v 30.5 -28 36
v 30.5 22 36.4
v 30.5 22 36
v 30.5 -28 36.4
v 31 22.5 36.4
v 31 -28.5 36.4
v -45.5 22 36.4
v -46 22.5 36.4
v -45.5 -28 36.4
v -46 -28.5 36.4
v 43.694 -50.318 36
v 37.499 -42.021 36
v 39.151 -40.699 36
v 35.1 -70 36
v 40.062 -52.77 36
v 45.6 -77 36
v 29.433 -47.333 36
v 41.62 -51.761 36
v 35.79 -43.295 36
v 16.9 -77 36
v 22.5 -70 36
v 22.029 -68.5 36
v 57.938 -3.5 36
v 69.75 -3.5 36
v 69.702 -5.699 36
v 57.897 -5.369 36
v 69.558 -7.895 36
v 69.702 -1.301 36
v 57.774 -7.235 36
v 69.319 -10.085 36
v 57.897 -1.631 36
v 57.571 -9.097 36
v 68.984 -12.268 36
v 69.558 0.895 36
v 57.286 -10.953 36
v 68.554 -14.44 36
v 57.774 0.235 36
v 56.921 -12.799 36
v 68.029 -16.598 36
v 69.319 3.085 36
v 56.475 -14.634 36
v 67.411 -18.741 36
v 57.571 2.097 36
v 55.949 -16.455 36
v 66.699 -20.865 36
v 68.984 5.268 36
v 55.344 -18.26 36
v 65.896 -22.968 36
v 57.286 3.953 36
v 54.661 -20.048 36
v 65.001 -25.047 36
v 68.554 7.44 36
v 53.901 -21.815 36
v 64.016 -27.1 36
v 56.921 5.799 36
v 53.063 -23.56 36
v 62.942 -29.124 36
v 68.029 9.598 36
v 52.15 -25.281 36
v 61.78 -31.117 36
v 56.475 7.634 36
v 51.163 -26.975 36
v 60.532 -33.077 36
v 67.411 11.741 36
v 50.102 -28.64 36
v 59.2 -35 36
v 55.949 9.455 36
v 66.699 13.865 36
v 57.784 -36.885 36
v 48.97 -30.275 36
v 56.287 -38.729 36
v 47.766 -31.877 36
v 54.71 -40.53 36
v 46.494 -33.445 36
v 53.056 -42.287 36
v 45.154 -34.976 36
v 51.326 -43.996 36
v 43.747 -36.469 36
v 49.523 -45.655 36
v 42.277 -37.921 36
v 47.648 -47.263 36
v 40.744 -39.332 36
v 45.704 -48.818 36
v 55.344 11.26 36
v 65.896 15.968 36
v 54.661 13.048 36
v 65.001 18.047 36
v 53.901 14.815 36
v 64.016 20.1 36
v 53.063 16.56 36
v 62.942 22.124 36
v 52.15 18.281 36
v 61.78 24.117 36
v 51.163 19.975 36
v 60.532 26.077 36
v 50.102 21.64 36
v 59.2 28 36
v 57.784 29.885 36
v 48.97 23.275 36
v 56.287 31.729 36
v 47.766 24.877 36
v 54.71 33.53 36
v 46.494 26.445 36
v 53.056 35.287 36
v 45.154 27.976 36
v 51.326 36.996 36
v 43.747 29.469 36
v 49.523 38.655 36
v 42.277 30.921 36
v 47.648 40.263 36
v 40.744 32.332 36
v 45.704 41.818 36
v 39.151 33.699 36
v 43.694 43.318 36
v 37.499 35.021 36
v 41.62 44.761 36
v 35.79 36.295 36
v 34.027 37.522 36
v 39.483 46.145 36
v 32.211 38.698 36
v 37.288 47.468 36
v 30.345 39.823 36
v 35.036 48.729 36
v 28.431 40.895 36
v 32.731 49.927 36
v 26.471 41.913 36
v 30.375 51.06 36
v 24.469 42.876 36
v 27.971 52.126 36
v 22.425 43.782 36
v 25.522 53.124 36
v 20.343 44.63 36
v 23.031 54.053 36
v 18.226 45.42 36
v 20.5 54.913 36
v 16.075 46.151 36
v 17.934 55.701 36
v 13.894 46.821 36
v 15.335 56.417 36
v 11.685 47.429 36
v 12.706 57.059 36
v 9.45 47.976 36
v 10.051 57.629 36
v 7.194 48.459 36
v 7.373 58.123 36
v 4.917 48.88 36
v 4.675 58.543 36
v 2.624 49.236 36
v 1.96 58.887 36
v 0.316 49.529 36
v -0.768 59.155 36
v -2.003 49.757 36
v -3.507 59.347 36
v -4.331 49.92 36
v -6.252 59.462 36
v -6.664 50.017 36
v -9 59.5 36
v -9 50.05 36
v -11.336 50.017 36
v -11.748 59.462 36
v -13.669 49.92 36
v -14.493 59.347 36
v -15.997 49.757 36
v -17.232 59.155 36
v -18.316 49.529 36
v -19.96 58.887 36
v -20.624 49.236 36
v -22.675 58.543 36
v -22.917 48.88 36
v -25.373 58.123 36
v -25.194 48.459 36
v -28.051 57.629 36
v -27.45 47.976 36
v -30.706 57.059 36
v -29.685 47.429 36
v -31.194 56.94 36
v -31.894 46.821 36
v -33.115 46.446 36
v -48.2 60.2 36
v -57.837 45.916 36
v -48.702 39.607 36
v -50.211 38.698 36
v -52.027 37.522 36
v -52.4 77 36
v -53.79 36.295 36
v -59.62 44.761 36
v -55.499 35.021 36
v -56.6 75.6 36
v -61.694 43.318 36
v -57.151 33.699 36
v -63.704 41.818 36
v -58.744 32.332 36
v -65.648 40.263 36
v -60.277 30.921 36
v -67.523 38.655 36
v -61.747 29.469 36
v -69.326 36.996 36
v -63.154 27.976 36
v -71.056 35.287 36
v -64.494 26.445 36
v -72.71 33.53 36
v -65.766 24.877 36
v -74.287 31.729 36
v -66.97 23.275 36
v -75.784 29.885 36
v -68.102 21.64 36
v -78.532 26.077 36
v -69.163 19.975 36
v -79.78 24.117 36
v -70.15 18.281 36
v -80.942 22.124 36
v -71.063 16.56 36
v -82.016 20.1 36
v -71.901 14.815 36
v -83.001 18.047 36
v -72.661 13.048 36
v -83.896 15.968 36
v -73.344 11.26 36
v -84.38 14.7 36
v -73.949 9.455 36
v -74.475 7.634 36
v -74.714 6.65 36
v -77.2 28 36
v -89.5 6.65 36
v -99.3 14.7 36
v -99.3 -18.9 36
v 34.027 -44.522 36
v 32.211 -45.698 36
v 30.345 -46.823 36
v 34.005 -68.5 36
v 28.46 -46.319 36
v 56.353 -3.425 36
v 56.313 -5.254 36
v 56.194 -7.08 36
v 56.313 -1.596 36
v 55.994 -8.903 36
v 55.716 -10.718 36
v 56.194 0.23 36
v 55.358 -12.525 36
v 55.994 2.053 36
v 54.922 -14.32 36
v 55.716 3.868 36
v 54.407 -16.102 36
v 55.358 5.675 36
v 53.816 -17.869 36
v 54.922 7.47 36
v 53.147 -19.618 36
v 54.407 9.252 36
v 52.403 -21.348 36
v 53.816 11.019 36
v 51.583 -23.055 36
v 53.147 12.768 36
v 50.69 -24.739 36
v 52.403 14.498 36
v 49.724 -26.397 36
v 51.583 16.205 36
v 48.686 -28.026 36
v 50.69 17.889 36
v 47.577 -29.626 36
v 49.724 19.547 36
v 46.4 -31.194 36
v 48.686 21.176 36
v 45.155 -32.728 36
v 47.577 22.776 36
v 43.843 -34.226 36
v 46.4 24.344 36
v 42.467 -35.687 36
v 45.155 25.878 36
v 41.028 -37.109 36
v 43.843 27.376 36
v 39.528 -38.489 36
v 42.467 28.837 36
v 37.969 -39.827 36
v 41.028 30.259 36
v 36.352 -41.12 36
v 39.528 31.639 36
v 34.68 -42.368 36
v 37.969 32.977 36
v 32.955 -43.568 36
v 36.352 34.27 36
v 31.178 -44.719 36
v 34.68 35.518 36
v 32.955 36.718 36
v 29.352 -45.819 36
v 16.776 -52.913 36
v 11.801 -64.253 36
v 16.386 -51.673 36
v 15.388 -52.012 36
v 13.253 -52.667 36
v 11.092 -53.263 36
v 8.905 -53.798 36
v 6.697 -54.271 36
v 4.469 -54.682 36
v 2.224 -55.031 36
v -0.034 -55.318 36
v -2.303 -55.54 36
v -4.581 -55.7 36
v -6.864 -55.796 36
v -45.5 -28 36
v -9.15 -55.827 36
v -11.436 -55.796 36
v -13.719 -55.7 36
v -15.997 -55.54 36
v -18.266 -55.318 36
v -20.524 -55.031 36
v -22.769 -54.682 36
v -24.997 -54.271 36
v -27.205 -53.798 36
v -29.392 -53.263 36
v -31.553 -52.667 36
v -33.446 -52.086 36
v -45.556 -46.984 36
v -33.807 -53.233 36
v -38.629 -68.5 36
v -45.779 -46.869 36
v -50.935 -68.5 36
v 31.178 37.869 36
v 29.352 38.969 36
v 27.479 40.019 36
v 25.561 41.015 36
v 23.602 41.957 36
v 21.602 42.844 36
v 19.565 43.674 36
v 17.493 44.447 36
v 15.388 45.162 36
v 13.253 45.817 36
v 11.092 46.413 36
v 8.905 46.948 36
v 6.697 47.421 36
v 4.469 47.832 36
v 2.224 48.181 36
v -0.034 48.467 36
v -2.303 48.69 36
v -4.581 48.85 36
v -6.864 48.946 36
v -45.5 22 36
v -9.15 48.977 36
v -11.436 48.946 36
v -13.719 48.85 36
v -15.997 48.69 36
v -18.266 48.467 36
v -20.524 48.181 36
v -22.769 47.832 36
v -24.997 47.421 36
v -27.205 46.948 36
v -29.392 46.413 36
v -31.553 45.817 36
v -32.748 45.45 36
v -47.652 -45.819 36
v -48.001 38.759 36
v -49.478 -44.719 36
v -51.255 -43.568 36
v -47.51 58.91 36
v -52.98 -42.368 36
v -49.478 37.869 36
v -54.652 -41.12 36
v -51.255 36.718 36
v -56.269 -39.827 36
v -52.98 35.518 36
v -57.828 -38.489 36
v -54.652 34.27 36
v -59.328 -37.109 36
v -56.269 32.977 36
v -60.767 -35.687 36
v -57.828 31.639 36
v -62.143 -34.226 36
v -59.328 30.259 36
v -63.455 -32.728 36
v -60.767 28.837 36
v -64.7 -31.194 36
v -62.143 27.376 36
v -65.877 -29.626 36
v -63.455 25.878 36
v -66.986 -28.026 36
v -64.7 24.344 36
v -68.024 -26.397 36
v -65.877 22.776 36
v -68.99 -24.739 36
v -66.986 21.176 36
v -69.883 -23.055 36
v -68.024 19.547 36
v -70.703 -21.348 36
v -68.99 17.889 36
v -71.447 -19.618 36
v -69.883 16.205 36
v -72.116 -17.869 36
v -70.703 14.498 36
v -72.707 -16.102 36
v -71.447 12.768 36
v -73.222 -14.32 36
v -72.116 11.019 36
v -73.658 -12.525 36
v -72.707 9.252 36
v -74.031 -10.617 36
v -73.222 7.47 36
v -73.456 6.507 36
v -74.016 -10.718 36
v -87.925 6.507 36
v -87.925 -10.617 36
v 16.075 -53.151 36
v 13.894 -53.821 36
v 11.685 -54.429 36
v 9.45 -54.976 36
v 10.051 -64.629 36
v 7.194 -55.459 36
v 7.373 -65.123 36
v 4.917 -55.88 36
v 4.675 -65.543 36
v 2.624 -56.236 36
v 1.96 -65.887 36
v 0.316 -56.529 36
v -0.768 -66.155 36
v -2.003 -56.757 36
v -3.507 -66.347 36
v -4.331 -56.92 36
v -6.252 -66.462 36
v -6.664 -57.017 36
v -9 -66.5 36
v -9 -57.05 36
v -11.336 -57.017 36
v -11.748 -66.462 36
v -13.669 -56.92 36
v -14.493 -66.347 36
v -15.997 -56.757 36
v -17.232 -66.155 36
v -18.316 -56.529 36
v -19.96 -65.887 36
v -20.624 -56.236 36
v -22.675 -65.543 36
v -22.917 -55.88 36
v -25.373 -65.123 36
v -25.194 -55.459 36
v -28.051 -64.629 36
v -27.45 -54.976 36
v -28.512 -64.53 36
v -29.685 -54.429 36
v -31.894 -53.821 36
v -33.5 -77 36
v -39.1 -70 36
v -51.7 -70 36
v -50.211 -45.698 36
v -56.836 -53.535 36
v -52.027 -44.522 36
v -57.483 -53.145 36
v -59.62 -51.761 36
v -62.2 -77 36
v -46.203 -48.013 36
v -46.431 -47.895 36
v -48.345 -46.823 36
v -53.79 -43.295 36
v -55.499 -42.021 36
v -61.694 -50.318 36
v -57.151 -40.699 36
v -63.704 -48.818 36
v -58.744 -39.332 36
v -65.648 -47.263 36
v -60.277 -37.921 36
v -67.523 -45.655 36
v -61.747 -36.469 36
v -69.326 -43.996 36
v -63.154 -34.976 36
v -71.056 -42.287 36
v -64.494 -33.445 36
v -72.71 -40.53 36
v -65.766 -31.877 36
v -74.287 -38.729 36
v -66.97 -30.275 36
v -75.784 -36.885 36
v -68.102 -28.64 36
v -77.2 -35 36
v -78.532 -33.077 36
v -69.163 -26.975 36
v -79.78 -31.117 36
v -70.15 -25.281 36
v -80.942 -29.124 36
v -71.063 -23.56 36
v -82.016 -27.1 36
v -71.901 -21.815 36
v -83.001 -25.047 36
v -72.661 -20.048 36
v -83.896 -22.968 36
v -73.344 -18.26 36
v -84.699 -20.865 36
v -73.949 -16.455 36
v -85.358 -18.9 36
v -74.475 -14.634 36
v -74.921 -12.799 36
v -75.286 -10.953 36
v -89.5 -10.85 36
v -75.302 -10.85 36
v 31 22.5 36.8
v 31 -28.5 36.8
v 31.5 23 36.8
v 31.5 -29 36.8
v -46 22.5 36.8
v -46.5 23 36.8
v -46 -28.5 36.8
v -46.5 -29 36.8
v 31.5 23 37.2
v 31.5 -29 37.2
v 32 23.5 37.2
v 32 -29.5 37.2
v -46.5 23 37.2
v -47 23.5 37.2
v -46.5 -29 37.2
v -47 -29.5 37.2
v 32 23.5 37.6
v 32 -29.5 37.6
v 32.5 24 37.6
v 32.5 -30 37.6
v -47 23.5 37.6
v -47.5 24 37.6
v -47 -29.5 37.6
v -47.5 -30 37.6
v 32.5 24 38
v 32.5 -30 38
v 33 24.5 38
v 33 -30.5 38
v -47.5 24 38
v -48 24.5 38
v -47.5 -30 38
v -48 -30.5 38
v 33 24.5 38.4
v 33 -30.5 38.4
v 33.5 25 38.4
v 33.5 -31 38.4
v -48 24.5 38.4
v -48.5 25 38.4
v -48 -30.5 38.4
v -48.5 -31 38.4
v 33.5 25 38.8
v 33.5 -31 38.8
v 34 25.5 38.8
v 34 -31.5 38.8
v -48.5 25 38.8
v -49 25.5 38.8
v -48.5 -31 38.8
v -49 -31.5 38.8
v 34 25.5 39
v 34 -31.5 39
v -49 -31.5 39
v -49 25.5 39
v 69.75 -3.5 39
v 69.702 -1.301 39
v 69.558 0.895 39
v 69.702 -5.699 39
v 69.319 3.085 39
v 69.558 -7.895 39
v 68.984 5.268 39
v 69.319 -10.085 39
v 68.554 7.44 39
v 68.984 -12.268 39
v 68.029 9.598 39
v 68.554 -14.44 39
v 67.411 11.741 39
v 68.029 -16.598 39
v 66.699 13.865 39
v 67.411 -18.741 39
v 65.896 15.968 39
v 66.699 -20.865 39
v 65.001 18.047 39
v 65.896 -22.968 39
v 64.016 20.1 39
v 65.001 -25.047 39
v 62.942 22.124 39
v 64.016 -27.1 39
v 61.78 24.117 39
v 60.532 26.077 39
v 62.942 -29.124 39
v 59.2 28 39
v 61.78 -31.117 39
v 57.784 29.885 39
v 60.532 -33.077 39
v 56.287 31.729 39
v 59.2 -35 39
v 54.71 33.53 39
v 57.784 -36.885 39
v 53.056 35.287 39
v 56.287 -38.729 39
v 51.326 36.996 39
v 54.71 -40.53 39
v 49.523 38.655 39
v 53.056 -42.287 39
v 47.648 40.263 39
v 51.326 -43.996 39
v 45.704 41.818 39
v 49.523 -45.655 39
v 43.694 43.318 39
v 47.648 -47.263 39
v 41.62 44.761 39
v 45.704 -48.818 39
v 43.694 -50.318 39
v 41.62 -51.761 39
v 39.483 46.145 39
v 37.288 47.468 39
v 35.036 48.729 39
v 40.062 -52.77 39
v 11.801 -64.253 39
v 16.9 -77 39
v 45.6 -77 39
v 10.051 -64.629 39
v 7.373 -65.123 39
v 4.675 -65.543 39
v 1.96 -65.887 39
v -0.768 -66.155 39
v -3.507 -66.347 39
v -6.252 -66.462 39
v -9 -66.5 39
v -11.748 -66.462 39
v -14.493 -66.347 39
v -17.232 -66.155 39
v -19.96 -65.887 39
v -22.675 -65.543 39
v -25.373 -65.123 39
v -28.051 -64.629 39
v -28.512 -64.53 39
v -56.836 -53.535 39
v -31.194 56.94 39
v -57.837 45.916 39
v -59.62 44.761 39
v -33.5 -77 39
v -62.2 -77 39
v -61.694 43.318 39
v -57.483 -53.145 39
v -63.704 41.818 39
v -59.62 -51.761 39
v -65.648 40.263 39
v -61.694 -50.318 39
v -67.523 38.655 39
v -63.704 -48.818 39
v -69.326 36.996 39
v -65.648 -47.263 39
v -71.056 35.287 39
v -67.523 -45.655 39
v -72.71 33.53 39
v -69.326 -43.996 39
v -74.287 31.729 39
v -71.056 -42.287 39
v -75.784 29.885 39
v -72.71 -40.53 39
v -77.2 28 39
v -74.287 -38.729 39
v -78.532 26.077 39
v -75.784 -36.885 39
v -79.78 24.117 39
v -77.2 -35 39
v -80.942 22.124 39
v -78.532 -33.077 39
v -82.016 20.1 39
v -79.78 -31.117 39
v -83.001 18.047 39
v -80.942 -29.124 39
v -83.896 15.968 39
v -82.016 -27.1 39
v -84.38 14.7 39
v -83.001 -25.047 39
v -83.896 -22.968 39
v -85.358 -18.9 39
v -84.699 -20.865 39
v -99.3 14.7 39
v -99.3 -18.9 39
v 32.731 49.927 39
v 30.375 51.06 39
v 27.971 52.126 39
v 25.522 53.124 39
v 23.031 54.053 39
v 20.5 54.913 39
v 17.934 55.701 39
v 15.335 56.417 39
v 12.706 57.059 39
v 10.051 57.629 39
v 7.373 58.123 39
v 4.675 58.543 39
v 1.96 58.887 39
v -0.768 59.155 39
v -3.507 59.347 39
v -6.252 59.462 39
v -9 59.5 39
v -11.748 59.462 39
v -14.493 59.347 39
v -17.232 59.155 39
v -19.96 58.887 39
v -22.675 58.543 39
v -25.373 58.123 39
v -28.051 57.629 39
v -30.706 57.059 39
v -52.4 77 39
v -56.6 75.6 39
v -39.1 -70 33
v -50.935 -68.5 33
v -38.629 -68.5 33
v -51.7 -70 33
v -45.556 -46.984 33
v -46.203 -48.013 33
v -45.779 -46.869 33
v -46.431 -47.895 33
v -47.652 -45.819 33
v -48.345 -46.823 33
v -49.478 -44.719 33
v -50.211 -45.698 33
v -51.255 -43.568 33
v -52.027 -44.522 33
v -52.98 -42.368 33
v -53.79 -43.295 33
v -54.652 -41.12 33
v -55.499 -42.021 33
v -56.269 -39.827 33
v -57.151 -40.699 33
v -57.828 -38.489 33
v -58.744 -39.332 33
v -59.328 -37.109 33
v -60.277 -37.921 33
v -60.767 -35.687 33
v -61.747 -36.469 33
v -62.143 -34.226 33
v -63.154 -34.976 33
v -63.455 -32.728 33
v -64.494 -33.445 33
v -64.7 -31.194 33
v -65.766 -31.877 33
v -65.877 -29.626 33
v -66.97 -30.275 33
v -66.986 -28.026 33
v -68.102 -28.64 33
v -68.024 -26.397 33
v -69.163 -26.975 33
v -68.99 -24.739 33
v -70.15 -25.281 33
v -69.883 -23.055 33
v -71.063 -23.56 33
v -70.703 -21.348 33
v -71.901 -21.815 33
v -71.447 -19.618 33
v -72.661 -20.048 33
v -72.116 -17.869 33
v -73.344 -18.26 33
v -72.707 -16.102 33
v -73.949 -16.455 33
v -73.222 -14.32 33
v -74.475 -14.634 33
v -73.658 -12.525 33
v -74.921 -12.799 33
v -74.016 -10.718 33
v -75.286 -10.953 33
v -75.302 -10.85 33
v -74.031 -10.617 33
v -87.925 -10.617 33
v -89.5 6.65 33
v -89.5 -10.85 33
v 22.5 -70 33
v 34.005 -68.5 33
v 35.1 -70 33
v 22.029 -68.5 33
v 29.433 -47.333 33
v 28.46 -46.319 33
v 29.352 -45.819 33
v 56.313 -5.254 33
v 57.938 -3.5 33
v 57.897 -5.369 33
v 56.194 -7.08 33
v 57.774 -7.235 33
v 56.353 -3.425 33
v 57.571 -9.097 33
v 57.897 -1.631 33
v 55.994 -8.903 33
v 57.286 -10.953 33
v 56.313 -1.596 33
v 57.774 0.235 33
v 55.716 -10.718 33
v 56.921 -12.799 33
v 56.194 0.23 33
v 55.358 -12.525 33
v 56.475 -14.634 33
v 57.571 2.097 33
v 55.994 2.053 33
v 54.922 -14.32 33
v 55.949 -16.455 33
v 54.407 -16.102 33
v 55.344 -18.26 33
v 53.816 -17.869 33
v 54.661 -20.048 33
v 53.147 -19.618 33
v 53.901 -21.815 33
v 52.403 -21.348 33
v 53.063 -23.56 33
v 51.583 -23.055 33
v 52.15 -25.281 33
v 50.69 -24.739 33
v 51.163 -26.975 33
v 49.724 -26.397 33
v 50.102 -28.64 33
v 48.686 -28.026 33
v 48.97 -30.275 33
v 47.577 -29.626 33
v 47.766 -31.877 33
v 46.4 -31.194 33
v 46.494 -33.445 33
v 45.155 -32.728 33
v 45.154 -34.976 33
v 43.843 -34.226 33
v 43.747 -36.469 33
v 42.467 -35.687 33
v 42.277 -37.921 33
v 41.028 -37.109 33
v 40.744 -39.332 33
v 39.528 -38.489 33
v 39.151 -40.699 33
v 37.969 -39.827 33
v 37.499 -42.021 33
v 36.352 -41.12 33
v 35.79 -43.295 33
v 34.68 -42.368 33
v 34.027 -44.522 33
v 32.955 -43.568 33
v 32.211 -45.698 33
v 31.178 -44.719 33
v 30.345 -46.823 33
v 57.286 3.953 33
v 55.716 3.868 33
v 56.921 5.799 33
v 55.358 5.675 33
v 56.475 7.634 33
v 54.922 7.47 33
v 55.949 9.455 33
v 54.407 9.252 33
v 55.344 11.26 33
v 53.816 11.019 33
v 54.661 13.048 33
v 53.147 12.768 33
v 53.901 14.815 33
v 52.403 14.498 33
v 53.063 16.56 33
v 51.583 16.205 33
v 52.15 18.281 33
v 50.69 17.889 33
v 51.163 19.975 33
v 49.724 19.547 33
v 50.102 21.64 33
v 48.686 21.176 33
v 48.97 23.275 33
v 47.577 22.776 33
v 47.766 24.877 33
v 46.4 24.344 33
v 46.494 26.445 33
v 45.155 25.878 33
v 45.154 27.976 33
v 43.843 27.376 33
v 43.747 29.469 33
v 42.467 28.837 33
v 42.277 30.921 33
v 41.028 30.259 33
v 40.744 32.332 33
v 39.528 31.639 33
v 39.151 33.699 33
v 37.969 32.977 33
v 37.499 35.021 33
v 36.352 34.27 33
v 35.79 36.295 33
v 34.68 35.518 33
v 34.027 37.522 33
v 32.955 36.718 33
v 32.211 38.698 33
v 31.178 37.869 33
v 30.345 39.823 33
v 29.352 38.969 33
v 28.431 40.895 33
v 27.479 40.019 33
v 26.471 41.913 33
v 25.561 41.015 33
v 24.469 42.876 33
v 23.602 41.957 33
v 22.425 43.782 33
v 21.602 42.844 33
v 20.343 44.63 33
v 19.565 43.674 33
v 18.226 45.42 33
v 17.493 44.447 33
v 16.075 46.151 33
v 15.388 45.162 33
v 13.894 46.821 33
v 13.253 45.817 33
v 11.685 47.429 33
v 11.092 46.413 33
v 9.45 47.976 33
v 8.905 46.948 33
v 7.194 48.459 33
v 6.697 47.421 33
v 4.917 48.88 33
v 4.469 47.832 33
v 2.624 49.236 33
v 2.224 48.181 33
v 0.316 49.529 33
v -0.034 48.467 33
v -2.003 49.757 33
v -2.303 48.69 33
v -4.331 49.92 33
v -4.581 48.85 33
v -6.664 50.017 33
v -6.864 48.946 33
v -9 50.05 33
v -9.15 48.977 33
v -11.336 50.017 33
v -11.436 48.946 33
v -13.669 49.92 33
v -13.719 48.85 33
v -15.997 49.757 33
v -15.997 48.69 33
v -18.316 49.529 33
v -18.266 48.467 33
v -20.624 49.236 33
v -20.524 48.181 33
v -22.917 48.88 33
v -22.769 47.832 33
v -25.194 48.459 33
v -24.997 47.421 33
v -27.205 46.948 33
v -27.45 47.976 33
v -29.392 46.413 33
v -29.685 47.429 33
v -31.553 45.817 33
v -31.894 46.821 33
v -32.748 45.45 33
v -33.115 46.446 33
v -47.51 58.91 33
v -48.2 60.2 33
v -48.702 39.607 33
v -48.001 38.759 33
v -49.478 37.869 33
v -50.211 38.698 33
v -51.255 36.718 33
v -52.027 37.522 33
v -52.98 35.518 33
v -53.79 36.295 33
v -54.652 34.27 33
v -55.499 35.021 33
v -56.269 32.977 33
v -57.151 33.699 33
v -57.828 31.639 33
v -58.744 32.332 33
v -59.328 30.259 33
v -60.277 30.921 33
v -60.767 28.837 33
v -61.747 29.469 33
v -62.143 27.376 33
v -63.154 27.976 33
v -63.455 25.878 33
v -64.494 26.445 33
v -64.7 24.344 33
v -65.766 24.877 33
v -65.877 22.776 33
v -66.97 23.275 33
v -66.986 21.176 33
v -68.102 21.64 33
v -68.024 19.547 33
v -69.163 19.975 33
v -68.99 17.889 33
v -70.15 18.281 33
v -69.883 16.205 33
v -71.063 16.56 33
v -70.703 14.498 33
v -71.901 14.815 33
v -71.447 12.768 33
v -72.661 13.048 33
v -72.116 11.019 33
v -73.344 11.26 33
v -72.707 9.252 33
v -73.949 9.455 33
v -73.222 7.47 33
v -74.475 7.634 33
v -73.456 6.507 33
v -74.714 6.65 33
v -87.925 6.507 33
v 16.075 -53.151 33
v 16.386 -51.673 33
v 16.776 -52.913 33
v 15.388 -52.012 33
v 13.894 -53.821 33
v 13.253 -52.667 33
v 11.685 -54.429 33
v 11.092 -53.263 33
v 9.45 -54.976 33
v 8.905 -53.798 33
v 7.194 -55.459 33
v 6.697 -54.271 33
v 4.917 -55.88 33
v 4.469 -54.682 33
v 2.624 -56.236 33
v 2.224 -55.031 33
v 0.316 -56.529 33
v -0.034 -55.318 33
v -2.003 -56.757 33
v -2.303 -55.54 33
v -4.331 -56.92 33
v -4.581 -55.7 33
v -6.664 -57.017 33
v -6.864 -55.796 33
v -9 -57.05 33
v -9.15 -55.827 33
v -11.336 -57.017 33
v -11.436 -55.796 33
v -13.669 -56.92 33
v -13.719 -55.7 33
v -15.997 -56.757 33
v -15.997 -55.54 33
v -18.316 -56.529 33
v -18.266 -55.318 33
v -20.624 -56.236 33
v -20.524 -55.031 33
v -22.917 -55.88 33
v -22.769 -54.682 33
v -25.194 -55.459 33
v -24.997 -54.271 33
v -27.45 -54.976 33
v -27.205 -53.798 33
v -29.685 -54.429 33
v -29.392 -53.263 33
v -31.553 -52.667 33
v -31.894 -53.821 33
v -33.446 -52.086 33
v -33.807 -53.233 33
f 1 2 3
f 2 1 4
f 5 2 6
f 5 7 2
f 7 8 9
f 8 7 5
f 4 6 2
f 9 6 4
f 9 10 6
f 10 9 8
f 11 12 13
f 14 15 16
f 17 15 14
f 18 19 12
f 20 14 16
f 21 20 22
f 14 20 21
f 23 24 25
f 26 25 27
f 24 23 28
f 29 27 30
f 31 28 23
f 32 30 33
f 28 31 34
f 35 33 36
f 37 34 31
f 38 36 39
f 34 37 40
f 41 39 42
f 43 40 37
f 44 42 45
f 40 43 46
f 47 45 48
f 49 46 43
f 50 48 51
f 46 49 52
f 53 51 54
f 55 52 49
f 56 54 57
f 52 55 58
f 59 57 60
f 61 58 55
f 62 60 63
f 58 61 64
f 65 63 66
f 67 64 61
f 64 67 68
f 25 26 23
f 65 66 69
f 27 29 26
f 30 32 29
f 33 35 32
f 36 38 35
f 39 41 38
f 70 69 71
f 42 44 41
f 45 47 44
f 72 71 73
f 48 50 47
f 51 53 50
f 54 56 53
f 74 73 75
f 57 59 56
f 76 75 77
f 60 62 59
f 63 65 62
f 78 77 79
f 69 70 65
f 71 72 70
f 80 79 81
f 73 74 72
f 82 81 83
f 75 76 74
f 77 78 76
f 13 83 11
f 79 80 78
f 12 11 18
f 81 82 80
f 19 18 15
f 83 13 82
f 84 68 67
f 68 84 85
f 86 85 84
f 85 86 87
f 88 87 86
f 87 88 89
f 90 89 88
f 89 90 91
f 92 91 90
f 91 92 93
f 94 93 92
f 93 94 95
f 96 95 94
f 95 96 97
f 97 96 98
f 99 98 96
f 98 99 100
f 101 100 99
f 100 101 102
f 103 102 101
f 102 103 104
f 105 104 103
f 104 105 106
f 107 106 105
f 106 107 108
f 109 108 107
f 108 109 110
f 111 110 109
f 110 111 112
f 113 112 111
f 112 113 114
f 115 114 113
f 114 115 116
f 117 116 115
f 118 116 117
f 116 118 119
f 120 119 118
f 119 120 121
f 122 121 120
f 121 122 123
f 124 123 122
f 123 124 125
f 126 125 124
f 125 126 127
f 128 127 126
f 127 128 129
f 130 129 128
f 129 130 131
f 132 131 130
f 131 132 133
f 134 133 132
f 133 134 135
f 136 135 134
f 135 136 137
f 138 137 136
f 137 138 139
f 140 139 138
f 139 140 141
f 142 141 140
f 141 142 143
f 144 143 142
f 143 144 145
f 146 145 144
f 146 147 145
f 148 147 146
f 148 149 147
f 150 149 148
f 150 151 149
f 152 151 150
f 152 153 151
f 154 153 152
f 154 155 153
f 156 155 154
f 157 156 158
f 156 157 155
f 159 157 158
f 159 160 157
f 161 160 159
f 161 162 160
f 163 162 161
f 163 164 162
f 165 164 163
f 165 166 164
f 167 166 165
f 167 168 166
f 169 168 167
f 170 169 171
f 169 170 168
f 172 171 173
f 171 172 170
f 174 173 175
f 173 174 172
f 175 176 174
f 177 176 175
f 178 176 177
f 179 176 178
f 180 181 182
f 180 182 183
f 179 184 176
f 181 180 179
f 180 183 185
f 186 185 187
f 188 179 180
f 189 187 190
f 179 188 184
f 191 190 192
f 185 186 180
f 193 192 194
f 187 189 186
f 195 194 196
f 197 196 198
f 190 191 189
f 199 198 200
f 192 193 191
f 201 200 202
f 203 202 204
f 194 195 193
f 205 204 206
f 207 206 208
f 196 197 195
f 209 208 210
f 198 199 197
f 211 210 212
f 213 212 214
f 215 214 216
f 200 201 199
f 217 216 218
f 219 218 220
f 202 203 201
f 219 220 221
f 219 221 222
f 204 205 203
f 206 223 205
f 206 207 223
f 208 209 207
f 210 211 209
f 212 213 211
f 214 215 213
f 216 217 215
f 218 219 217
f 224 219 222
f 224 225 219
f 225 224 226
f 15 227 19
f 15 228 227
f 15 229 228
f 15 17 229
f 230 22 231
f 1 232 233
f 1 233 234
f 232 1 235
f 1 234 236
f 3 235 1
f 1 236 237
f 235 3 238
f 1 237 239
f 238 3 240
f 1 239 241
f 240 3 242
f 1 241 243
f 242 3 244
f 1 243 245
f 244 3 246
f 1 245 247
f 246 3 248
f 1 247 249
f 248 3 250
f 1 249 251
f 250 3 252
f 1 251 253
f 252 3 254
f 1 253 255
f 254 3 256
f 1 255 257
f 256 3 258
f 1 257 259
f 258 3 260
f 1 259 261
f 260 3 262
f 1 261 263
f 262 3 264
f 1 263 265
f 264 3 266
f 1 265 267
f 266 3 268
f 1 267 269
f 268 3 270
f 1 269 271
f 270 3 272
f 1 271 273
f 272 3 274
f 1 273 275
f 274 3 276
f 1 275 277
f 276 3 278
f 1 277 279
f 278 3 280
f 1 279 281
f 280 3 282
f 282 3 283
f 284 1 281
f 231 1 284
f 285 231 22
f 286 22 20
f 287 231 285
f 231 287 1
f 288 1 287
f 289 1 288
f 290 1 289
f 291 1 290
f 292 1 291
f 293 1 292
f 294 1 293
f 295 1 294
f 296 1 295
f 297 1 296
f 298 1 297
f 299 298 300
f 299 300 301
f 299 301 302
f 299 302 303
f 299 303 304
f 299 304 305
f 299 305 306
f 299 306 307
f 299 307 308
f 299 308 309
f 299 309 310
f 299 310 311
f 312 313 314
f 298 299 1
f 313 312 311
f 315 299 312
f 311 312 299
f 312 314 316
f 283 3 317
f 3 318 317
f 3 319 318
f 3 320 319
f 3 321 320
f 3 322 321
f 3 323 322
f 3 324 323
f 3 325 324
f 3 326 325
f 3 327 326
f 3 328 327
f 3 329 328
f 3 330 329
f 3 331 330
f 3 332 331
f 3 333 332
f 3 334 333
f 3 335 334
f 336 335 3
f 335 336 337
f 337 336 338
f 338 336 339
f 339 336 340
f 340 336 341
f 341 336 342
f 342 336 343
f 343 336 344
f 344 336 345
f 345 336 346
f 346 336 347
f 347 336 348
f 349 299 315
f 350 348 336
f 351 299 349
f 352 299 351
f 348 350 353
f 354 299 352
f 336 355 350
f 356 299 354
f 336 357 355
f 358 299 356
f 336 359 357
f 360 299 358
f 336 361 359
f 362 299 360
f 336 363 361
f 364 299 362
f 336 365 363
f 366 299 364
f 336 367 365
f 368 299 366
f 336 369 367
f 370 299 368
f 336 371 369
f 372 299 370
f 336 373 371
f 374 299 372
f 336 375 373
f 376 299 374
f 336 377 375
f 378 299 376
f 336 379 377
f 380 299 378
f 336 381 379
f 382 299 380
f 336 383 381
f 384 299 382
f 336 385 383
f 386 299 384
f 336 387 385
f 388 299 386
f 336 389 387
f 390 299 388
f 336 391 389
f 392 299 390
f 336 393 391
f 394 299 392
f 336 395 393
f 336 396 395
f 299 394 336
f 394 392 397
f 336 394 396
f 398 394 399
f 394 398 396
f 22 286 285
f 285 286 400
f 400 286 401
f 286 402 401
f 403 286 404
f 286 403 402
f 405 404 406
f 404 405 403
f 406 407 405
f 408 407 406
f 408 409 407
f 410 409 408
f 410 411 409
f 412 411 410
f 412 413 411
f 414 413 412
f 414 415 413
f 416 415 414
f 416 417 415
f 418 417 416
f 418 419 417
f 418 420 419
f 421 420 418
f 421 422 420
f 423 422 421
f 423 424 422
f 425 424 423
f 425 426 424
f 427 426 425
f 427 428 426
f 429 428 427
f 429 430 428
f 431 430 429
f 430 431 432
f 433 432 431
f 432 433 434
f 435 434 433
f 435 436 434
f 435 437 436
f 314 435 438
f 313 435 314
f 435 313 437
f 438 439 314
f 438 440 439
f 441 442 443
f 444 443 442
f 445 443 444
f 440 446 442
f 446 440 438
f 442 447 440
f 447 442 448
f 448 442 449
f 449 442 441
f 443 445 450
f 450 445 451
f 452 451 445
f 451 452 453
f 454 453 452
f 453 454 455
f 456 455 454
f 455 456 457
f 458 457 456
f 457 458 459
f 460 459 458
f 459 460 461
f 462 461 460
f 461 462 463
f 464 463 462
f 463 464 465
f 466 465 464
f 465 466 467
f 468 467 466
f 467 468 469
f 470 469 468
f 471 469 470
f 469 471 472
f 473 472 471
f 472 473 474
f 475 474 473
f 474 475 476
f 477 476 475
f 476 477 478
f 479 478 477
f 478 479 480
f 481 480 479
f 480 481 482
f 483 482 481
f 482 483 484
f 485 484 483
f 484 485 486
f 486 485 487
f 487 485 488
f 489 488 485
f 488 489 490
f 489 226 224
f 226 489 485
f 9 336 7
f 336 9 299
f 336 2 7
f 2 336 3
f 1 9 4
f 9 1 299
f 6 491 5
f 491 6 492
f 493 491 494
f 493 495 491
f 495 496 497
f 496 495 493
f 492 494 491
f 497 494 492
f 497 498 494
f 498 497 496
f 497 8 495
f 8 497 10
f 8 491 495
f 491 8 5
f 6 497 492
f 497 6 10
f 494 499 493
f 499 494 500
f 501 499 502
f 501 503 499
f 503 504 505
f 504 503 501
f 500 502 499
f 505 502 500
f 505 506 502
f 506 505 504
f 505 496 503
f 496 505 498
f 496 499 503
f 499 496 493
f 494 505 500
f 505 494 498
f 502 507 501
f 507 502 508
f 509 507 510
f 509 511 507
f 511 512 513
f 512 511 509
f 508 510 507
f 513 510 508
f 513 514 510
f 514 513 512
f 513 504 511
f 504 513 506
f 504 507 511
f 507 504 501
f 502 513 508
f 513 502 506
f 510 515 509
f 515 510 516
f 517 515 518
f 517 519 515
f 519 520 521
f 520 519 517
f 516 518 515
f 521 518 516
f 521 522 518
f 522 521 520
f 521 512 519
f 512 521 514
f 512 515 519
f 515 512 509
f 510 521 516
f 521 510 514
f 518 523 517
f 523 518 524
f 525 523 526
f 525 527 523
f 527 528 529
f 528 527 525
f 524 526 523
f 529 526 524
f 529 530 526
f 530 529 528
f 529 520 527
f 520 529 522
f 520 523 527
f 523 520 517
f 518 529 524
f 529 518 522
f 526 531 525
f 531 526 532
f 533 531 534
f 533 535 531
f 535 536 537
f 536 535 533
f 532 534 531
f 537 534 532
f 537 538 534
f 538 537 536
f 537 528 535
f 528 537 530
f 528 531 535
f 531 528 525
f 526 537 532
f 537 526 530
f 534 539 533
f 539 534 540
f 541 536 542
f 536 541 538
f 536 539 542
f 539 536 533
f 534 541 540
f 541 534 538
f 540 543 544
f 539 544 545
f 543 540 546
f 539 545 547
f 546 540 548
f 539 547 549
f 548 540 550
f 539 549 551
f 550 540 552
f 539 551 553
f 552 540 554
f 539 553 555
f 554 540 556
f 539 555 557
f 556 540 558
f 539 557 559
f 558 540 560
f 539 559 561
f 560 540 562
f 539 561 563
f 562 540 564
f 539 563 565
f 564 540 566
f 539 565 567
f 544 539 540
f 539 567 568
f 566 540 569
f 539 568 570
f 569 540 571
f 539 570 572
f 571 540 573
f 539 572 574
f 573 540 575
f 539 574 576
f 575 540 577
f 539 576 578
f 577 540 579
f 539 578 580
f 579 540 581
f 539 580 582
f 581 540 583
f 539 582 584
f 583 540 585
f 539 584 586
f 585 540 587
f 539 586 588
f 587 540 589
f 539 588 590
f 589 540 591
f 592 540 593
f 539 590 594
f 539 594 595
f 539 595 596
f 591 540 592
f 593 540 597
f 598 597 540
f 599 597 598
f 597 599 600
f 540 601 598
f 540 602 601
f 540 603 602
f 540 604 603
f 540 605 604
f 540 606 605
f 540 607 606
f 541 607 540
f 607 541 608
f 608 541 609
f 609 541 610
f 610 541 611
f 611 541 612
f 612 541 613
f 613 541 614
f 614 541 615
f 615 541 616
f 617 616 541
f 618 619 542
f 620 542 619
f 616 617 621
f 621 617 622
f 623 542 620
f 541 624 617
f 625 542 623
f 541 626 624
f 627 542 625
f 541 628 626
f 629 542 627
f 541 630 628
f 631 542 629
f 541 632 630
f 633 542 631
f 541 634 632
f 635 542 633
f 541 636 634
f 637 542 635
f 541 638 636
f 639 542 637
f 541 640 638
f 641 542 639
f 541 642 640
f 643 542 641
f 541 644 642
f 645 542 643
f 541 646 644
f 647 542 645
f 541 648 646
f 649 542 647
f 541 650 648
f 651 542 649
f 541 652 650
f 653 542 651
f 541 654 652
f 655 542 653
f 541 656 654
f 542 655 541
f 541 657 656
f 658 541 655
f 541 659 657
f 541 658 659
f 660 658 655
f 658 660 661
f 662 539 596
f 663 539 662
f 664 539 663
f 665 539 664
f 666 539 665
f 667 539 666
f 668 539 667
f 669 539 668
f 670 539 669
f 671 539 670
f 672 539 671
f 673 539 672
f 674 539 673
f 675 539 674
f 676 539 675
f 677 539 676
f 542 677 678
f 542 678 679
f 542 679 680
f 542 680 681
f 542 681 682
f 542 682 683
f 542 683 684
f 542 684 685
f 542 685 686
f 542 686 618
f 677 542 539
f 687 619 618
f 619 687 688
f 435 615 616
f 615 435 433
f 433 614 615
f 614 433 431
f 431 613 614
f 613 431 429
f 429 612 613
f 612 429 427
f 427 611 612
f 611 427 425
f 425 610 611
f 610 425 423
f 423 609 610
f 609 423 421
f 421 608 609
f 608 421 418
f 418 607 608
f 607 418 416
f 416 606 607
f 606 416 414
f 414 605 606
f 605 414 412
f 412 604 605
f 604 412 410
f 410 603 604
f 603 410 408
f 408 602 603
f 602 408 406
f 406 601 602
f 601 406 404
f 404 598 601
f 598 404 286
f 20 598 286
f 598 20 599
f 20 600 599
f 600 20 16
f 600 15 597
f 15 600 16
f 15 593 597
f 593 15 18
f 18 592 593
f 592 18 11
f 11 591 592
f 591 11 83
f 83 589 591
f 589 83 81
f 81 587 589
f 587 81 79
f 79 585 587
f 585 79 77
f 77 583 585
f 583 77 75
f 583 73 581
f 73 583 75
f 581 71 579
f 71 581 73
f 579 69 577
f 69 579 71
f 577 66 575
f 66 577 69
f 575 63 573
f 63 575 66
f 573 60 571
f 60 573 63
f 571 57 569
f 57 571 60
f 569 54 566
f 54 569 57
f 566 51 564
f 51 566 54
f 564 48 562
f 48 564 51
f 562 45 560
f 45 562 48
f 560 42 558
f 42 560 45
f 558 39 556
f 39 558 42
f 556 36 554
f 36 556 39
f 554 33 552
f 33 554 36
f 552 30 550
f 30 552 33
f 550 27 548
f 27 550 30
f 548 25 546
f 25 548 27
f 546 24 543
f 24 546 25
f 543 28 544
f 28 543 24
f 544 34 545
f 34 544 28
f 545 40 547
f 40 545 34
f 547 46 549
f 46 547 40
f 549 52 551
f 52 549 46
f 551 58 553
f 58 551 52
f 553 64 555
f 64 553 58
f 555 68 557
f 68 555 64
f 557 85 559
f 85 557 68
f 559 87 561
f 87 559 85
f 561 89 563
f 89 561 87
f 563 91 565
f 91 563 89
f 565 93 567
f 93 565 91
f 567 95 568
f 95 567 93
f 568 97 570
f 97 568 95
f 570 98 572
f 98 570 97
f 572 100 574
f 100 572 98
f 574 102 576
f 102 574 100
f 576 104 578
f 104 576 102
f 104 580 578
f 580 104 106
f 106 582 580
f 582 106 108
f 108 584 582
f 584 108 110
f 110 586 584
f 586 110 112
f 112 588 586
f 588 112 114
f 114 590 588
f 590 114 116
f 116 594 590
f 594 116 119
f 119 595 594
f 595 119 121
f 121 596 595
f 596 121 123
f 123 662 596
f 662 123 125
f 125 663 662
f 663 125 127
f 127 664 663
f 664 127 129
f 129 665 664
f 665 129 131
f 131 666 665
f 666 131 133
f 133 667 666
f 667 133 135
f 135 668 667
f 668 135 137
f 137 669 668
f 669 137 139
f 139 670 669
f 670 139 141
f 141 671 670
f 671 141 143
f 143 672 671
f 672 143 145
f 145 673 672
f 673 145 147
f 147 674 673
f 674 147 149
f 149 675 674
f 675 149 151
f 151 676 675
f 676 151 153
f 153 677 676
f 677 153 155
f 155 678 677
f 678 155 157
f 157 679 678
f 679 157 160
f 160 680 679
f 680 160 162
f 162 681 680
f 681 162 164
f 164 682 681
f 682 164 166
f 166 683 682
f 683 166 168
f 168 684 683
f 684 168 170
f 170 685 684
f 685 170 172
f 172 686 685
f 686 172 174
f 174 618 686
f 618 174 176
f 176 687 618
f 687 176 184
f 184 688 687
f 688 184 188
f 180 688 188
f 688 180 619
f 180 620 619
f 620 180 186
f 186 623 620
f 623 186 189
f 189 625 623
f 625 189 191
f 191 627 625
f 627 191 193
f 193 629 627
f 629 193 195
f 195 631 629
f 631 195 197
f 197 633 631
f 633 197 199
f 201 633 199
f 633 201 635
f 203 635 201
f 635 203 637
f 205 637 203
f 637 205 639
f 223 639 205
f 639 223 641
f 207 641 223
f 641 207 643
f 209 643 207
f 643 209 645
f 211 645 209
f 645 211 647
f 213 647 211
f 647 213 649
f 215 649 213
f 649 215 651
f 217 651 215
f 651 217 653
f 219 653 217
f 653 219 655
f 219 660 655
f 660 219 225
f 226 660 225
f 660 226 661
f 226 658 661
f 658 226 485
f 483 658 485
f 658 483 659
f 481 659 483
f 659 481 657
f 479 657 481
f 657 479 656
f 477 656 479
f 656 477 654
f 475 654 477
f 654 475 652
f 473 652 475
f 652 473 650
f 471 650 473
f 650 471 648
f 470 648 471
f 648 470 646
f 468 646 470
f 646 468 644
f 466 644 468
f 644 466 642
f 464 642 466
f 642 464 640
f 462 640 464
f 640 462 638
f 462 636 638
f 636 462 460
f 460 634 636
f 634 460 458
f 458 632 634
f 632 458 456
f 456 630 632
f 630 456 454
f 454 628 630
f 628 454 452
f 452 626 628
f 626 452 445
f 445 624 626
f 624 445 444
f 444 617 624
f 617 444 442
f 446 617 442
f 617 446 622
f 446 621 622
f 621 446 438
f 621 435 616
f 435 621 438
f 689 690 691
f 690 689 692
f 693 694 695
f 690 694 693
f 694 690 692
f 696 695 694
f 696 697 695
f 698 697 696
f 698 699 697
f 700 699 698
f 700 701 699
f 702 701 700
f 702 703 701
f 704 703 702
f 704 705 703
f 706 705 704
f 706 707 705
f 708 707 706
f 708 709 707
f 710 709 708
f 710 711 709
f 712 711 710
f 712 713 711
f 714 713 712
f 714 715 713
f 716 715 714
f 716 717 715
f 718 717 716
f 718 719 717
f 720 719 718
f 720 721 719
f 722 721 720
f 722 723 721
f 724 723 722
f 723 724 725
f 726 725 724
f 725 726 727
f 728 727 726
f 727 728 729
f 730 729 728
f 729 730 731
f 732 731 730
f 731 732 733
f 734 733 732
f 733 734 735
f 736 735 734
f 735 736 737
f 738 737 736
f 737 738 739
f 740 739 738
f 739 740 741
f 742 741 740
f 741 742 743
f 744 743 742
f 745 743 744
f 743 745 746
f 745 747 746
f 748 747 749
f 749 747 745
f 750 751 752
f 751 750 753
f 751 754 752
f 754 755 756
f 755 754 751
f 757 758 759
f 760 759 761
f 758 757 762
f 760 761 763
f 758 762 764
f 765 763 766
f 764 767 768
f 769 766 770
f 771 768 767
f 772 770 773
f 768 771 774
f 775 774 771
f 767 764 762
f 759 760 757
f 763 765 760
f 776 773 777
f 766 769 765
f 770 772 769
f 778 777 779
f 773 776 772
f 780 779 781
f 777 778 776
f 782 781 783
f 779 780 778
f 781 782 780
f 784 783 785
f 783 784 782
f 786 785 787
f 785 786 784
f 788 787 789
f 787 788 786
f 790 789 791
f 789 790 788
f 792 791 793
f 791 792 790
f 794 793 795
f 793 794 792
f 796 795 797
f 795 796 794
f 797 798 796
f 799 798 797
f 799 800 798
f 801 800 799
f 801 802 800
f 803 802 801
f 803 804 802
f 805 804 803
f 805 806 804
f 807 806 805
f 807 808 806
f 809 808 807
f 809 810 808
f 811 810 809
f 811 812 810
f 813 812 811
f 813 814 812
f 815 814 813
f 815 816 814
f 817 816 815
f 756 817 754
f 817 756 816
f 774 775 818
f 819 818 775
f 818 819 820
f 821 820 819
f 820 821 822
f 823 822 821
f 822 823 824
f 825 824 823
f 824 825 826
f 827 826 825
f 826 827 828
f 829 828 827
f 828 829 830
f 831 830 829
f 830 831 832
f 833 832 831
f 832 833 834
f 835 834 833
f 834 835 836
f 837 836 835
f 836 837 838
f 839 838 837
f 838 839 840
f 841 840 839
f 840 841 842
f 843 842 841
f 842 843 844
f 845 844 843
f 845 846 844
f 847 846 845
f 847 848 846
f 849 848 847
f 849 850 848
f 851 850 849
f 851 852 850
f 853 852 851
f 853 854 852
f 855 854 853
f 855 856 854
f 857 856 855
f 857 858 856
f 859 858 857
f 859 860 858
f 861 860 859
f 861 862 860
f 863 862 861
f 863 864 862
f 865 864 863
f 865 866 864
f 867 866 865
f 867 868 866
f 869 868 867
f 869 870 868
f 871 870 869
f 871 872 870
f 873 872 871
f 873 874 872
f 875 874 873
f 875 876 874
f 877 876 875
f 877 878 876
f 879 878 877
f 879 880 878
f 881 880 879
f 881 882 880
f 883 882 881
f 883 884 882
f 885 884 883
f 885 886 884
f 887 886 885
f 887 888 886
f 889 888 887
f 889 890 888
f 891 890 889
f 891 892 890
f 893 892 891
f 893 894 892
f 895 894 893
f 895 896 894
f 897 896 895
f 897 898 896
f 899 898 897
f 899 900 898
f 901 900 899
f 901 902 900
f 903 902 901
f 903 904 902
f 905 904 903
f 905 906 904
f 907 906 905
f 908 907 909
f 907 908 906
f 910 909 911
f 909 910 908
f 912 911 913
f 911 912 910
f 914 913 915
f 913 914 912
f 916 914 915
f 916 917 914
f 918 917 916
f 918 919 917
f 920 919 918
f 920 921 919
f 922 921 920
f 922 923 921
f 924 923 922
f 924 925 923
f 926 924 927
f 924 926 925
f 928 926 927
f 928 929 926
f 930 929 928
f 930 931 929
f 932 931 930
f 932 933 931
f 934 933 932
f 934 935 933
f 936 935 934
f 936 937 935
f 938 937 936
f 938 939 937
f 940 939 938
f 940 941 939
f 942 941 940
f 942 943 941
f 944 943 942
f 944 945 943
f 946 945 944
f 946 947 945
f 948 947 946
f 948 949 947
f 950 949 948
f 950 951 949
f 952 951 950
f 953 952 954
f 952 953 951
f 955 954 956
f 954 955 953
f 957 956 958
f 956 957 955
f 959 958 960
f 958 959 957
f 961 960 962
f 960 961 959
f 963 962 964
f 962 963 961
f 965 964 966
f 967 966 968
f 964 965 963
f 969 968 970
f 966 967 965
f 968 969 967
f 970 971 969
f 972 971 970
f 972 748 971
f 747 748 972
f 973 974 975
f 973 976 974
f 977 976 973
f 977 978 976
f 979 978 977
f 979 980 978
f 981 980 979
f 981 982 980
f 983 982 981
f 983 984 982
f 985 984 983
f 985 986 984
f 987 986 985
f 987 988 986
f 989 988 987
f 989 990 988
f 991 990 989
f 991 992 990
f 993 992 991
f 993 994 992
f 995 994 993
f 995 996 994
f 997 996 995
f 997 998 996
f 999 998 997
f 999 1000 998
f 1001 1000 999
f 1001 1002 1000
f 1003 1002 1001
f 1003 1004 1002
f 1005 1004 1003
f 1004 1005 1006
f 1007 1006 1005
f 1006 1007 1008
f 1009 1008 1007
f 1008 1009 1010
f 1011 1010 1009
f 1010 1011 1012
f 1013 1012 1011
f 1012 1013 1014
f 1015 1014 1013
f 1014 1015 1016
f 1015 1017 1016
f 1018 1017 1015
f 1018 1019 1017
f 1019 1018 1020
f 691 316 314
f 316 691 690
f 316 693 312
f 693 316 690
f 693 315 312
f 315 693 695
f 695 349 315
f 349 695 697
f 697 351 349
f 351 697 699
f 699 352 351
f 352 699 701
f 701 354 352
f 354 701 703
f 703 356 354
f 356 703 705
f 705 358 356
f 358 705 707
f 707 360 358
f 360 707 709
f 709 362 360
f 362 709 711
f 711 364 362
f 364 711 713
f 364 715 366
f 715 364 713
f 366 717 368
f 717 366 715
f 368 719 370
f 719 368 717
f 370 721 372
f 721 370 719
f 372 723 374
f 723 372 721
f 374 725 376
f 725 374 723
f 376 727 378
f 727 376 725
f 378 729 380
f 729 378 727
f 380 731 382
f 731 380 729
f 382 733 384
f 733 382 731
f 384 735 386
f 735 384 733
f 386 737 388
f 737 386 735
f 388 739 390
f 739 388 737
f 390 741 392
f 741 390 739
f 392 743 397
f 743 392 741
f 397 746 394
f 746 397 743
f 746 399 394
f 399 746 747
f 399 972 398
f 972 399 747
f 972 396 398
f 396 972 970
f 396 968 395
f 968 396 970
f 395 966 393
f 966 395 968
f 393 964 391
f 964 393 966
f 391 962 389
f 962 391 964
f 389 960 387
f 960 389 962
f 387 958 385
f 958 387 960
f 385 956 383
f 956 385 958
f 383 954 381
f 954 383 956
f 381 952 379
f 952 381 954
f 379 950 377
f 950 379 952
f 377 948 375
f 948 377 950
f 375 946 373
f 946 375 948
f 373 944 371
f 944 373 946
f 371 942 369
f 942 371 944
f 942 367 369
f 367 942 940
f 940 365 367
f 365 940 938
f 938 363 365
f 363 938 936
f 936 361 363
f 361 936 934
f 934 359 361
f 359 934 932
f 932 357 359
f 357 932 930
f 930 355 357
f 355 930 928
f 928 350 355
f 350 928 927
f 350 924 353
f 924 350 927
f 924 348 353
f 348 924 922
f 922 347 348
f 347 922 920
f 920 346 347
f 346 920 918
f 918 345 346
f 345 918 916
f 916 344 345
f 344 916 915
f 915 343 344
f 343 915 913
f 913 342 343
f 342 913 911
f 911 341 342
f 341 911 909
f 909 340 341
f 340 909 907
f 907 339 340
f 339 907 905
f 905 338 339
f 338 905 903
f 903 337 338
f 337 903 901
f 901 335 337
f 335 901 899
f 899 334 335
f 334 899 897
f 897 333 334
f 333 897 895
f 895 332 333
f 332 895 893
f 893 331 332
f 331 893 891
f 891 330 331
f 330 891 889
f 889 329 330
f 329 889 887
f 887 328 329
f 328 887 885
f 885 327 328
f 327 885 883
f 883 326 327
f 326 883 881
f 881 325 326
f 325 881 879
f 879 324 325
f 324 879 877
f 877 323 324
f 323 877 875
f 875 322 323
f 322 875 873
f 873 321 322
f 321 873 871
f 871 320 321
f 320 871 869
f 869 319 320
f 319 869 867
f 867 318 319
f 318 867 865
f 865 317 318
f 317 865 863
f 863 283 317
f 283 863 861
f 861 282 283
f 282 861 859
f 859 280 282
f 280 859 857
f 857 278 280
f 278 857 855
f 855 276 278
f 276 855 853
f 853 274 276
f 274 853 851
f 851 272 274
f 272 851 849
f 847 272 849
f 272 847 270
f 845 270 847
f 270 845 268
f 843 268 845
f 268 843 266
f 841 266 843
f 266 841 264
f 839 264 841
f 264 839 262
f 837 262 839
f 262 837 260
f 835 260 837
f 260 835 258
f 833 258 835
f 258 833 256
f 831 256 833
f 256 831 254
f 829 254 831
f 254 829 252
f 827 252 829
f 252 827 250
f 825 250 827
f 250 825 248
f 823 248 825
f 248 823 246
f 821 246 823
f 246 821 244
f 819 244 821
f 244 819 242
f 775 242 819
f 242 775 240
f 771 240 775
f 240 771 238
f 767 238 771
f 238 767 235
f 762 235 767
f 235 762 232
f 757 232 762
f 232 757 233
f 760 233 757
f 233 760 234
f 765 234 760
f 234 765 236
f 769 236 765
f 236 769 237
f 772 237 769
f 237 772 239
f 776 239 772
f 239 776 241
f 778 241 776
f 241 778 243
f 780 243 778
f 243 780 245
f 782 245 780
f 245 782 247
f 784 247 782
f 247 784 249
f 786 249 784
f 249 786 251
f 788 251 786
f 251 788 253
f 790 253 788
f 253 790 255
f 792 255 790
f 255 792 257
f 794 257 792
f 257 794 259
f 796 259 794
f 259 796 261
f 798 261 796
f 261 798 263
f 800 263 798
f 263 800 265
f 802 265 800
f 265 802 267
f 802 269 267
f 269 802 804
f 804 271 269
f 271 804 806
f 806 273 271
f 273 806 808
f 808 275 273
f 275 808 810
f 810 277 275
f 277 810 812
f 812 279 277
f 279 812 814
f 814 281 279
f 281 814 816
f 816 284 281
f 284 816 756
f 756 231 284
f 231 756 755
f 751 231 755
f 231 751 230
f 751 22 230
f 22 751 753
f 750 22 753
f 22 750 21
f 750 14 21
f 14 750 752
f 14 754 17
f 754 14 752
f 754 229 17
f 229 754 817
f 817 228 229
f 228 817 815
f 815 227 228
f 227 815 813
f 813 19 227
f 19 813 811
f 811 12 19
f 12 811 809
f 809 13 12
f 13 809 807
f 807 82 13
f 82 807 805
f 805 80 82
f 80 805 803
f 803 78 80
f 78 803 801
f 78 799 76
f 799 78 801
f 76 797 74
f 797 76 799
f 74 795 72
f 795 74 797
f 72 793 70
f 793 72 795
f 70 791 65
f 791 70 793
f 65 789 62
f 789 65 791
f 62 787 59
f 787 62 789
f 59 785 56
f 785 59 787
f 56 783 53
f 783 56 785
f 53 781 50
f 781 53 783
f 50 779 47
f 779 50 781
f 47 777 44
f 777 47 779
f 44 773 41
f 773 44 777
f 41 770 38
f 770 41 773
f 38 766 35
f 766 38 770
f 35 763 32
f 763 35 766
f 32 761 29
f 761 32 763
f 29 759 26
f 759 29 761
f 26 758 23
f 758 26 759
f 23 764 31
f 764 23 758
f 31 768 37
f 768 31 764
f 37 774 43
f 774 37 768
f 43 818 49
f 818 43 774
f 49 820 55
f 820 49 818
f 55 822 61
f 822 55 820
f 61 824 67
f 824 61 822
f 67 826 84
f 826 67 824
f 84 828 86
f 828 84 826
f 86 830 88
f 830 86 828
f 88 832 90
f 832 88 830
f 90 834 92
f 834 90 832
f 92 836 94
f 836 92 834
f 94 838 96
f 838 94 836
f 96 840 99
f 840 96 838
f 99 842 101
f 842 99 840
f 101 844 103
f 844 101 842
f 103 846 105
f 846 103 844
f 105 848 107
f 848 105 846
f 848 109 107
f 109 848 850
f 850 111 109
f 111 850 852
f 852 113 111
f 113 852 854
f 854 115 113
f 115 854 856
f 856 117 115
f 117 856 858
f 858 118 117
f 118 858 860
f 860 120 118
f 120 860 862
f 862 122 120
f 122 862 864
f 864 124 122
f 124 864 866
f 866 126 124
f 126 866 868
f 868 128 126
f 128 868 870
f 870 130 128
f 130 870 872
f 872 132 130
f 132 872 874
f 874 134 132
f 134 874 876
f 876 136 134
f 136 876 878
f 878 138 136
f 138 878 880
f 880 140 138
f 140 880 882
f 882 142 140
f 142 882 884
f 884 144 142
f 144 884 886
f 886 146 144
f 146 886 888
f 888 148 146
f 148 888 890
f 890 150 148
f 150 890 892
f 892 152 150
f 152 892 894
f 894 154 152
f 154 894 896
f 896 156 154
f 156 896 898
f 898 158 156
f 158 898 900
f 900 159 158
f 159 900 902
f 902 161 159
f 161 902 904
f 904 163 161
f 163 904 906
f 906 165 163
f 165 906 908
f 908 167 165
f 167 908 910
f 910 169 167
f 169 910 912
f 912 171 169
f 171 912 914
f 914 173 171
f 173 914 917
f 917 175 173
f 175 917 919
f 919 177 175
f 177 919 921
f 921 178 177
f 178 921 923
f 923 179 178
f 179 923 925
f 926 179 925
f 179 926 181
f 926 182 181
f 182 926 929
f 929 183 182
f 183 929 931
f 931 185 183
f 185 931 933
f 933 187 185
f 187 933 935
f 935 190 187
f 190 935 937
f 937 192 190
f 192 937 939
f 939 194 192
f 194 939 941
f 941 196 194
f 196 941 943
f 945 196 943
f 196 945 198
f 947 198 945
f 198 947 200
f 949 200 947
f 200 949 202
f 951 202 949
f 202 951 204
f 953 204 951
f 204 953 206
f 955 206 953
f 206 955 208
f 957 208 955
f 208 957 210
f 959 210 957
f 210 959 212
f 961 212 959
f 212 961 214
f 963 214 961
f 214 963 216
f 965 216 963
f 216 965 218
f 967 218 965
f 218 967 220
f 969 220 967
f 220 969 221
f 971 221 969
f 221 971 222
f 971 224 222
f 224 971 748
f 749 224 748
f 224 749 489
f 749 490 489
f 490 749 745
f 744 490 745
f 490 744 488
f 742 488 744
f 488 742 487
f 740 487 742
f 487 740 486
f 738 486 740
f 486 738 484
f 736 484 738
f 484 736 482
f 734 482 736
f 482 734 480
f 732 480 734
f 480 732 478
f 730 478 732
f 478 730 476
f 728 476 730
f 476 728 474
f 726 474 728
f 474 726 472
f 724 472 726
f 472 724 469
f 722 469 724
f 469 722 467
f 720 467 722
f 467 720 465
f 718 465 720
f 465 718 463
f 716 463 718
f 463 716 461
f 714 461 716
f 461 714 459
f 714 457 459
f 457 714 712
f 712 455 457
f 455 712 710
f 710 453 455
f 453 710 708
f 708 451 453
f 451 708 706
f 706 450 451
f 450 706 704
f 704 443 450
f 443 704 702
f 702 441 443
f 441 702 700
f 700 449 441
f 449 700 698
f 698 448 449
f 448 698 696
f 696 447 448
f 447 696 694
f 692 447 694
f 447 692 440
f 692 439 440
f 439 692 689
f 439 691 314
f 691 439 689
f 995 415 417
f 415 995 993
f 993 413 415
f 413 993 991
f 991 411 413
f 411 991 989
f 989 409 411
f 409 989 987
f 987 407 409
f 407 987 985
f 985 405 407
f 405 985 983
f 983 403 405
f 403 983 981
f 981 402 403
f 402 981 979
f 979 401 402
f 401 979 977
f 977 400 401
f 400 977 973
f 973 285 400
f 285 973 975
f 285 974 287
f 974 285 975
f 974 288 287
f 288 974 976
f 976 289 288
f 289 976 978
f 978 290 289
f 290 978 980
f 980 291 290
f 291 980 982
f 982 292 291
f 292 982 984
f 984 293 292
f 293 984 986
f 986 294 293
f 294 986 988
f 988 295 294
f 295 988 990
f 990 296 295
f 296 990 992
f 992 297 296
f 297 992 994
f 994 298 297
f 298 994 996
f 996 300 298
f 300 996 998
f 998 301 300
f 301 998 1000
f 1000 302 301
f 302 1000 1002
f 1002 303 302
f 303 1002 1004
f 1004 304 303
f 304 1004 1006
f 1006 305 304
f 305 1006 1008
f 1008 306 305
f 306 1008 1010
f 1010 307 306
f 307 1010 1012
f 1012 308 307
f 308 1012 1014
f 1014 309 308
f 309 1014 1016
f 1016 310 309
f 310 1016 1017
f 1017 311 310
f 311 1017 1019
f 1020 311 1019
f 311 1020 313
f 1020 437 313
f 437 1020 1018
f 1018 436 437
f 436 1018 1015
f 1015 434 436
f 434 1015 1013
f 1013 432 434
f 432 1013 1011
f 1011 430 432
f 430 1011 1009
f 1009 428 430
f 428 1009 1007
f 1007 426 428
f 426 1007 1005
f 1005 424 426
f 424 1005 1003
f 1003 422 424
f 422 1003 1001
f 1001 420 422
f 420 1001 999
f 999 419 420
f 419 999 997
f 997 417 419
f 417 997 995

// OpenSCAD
module pig_body(){
    translate([10, -5, 0])
    scale([2.25,1.8,0])
    difference() {
        circle(d=100, $fn=180);
    }
};

module pig_body_inner(){
    translate([10, -5, 0])
    scale([2.25,1.8,0])
    difference() {
        circle(d=85, $fn=180);
    }
};

module pig_foot() {
    polygon([[-58,-75],[-66, -110],[-25,-110],[-15, -85]]);        
};

module pig_foot_inner() {
    polygon([[-41,-60],[-51,-100],[-33,-100],[-22,-65]]);
};

module pig_nose() {
    translate([-105,-3,0])
    square([28,48], center = true);
};

module pig_nose_inner() {
    translate([-90,-3,0])
    square([30,25], center = true);
    
};

module pig_ear() {
    polygon([[-52,110],[-58,108],[-60,60],[-15,75]]);
};

module pig_ear_inner() {
    polygon([[-46,86],[-47,45],[-12,55]]);
};

module solid_pig() {
    union () {
        pig_body();
        pig_foot();
        translate([22,0,0])
        mirror([1,0,0])
        pig_foot();
        pig_nose();
        pig_ear();
    };
};

module inner_pig() {
    union() {
        pig_body_inner();
        pig_foot_inner();
        translate([22,0,0])
        mirror([1,0,0])
        pig_foot_inner();
        pig_nose_inner();
        pig_ear_inner();
        }
};

module pig_outline() {
    difference() {
    scale([0.7, 0.7, 1])
        solid_pig();
    scale([0.7, 0.7, 1])
        inner_pig();
    };
};

module air_hole() {
    rotate([90,0,0])
    cylinder(h=20, r=3, $fn=20);    
}

module air_holes() {
    translate([-5,65,11])
    air_hole();
    translate([-5,65,24])
    air_hole();
    translate([8,65,11])
    air_hole();
    translate([8,65,24])
    air_hole();
    translate([21,65,11])
    air_hole();
    translate([21,65,24])
    air_hole();
}

module oinker() {
    translate([21,65,11])
    scale([1.5,1,1.5])
    air_hole();
    translate([21,65,24])
    scale([1.5,1,1.5])
    air_hole();
}

module pig_main() {
    difference() {
        color("seagreen")
        linear_extrude(35)
        pig_outline();
        air_holes();
        translate([34,60,11])
        air_hole();
        translate([34,60,24])
        air_hole();
        translate([0,-115,0])
        air_holes();

        translate([-22,-23,0])
        rotate([0,0,90])
        oinker();  
    };
}

module screw_pole() {
    color("yellow")
    difference() {
        union() {
            cylinder(h=15, r=3.0, $fn=20);
            translate([-5,-5,0])
            cube([10,10,12]);
        }
        translate([0,0,-1])
        cylinder(h=17, r=1.4, $fn=20);
        translate([-2.6,-6.9,8.5])
        cube([5.2,10,2.1]);
    };
}

module _back_side() {
    union() {
        color("lightgreen")
        linear_extrude(3)
        scale([0.7, 0.7, 1])
        solid_pig();

        translate([50,19,0])
        rotate([0,0,180])
        screw_pole();
        translate([50,-29,0])
        screw_pole();
        translate([-8,-29,0])
        screw_pole();
        translate([-8,19,0])
        rotate([0,0,180])
        screw_pole();
    };
};

module bezel() {
    union() {
        translate([0,-0.5,0])
        cube([76,50,0.4]);
        translate([-0.5,-1,0.4])
        cube([77,51,0.4]);
        translate([-1.0,-1.5,0.8])
        cube([78,52,0.4]);
        translate([-1.5,-2,1.2])
        cube([79,53,0.4]);
        translate([-2,-2.5,1.6])
        cube([80,54,0.4]);
        translate([-2.5,-3,2])
        cube([81,55,0.4]); 
        translate([-3,-3.5,2.40])
        cube([82,56,0.4]); 
        translate([-3.5,-4,2.80])
        cube([83,57,0.4]); 
    }
}

module _front_side() {
    difference() {
        color("lightgreen")
        linear_extrude(3)
        scale([0.7, 0.7, 1])
        solid_pig();
        translate([-29.5, -27.5, 0])
        bezel();
    }
}

module screen() {
    color("black")
    cube([85,57,7]);
}

module rasp_pi_a() {
    cube([70,57,20]);
};
    
module hdmi_plug() {
    color("grey")
    cube([16,10,17]);
}
    
module pi_unit(){
    translate([2,0,20])
    screen();
    translate([27,-10,0])
    hdmi_plug();
    color("red")
    rasp_pi_a();
}

module screw_measure() {
    color("blue")
    union() {
        translate([-22,18,-4])
        cube([58,1,1]);    
        translate([-22,-30,-4])
        cube([58,1,1]);
        translate([-22,-30,-4])
        cube([1,49,1]);
        translate([35,-30,-4])
        cube([1,49,1]);
    };    
}

module mount_test() {
    translate([-100,-95,-5])
    cube([200,60,10]);
    translate([-100,35,-5])
    cube([200,60,10]);
    translate([-113,-45,-5])
    cube([90,90,10]);
    translate([49,-45,-5])
    cube([40,90,10]);
    translate([13,0,-5])
    cylinder(h=10, r=30);
}

module _usb_port() {
    translate([3,-1,1.75])
    color("silver")
    cube([8.4,6,3]);
    difference() {
        color("green")
        cube([14.6,16,1.8]);
        translate([3.3,10,-1])
        cylinder(r=1.9,h=4,$fn=30);
        translate([11.1,10,-1])
        cylinder(r=1.9,h=4,$fn=30);
    }
}

module usb_port() {
    rotate([90,0,180])
    translate([-7,-2.05,-40])
    _usb_port();
}

module _usb_ledge() {
    difference() {
        cube([14.6,13,8.2]);
        translate([3.3,10,-1])
        cylinder(r=1.9,h=14,$fn=30);
        translate([11,10,-1])
        cylinder(r=1.92,h=14,$fn=30);
    }
}

module usb_ledge() {
    color("blue")
    rotate([90,0,180])
    translate([-7,-2.05,-48.25])
    _usb_ledge();
}

module usb_port_test() {
    translate([-110,-30,-10])
    cube([200,120,60]);
    translate([-110,-85,-10])
    cube([90,100,60]);
    translate([5,-90,-10])
    cube([90,100,60]);
    translate([-110,-85,-10])
    cube([200,30,60]);
}

module toggle_test() {
    translate([-100,-90,-10])
    cube([140,180,60]);
    translate([35,-90,-10])
    cube([60,90,60]);
}

module edge_grip() {
    color("red")
    linear_extrude(3)
    difference() {
        translate([-8,0,3])
        scale([0.7, 0.7, 1])
        inner_pig();
        translate([-8,0,3])
        scale([0.685, 0.685, 3])
        inner_pig();
    };
}

module back_side() {
    union() {
        edge_grip();
        difference() {
            translate([-8,0,-3])
            _back_side();
            usb_port();
        }
        usb_ledge();
    };
}

module front_side() {
   _front_side();
   translate([8,0,-3])
   edge_grip();
}

module _toggle() {
    union() {
        color("silver")
        translate([4.95,7.6,20])
        cylinder(h=6,r=3.2,$fn=30);
        color("blue")
        cube([10,15,20]);
    }
}

module toggle() {
    translate([46,12,23])
    rotate([0,90,45])
    _toggle();
}

difference() {
//    translate([-16,0,0])
//    pig_main();
//    toggle();
    //toggle_test();
}

difference() {
    //translate([-8,0,0])
    //back_side();
    //usb_port_test();
    //mount_test();
}
//
//translate([40,23,12])
//rotate(180)
//pi_unit();


translate([-16,0,36])
front_side();

//translate([6,6,0])
//screw_measure();
